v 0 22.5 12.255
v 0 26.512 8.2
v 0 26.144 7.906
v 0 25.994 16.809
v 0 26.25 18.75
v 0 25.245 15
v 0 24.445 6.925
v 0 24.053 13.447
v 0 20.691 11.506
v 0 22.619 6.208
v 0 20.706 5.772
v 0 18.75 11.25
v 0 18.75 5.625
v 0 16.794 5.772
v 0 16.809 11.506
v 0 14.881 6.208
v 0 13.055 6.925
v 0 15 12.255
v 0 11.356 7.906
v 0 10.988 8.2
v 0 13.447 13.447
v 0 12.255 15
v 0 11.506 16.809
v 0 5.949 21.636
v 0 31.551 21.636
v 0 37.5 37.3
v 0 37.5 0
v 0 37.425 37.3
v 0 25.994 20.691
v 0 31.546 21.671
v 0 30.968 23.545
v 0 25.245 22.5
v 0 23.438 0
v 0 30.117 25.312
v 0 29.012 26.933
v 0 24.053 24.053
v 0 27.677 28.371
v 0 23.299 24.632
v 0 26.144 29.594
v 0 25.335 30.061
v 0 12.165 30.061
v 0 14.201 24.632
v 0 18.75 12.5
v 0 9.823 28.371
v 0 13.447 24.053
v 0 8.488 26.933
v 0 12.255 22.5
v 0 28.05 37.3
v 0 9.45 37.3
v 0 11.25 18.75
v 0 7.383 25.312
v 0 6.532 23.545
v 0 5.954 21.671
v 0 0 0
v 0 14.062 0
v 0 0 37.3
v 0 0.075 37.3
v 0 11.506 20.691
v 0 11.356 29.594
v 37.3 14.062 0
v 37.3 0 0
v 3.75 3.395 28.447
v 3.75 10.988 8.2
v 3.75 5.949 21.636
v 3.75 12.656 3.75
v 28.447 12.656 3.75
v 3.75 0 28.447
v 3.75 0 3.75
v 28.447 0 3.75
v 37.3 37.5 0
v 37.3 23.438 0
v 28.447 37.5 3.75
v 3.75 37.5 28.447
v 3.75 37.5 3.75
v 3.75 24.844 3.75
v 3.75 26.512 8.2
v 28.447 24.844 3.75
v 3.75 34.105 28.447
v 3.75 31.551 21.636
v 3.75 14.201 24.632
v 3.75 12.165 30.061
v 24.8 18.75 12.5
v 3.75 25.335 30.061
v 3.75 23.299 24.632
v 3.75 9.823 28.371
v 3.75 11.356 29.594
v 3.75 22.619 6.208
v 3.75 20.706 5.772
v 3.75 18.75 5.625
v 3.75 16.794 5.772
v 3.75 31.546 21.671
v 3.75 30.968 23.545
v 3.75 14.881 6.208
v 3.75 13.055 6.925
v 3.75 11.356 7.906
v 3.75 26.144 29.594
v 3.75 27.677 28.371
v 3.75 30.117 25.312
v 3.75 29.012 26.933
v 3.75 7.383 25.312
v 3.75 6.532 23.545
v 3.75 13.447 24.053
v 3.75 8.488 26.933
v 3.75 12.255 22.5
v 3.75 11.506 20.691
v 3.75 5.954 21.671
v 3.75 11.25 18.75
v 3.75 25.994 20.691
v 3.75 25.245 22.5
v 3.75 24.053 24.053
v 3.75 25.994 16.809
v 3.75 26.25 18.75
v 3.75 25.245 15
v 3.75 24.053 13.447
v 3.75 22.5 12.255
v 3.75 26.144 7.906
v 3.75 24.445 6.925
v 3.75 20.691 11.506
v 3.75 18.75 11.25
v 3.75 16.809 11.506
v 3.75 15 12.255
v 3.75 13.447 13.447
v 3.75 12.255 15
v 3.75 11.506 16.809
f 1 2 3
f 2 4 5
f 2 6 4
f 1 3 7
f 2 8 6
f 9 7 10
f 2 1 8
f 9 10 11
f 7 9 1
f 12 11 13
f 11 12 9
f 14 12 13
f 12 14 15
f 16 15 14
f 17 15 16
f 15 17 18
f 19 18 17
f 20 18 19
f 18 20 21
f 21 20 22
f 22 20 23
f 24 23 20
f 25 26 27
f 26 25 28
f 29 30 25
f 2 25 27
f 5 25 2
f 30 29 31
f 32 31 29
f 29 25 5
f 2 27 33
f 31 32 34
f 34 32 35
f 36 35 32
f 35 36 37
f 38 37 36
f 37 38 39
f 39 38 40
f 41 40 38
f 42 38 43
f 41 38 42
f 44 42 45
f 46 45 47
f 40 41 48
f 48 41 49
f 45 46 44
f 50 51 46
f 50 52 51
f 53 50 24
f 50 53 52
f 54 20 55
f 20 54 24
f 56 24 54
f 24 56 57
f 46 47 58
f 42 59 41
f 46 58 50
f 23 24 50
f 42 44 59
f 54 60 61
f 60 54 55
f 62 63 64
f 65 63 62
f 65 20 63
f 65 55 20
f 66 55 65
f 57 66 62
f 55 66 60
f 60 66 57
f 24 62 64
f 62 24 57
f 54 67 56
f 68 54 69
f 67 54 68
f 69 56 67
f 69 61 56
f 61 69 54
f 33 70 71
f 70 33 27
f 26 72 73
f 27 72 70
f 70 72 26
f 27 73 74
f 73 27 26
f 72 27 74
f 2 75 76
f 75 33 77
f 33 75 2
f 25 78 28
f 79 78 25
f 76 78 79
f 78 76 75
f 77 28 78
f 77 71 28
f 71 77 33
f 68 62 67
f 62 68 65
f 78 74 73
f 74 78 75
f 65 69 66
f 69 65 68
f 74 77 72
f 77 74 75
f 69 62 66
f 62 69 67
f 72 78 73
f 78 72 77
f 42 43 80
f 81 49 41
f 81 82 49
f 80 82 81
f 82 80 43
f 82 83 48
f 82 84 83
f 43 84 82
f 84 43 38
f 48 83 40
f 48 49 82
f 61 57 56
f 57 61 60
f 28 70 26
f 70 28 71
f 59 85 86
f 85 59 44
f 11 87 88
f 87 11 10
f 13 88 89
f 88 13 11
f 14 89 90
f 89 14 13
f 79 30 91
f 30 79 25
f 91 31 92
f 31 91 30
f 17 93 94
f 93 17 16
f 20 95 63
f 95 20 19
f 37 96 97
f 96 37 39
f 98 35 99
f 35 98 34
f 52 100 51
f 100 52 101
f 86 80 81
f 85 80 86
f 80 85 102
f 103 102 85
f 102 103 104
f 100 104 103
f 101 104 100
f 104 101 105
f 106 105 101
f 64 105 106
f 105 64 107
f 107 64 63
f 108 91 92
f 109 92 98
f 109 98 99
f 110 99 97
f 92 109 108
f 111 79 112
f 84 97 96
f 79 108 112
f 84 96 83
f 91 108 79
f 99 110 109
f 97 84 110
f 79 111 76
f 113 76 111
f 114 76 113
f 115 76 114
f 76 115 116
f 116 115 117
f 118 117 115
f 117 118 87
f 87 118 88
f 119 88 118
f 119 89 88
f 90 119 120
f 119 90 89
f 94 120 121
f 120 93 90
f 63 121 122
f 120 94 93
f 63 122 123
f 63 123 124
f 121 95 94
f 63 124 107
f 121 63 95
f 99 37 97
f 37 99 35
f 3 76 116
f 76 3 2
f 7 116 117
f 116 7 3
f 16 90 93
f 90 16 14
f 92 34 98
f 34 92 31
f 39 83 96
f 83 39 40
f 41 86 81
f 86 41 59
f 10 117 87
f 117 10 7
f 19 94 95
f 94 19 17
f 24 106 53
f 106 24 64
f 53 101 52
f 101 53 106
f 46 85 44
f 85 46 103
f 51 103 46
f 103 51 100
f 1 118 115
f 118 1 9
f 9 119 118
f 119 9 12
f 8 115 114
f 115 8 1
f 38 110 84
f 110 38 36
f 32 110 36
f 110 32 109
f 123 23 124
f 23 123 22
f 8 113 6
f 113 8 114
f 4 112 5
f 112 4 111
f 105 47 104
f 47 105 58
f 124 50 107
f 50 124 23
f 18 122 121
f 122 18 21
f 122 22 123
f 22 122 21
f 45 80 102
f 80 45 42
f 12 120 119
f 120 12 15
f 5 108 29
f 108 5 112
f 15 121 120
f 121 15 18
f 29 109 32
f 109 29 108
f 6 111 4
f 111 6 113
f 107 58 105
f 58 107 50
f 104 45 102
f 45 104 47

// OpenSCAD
// file: wedges.scad
module Wedge ( dx, dy, dz ) {
    linear_extrude( dz ) {
        polygon( points = [ [0, 0], [dx, 0], [dx, dy], [0, 0] ] );
    };
};

module BiWedge ( dx, dy, dz ) {
    linear_extrude( dz ) {
        polygon( points = [ [0, 0], [dx, 0], [dx/2, dy], [0, 0] ] );
    };
};
// file: bookend2.scad
use <wedges.scad>

module Bookend2(
        length,
        width,
        height,
        t1,
        t2 )
{
    ratio  = height / (( width - t1 ) / 2 );
    ratio2 = height / length;

    intersection() {
        union() {
            difference() {
                union() {
                    // cut out left wedge in x direction
                    translate( [ 0, (width-t1)/2, 0 ] )
                    mirror( [ 0, 1, 0 ] )
                    rotate( 90, [ 0, 0, 1 ] )
                    rotate( 90, [ 1, 0, 0 ] ) {
                        Wedge( (width-t1)/2, height, length );
                    };

                    // cut out right wedge in x direction
                    translate( [ 0, (width+t1)/2, 0 ] )
                    rotate( 90, [ 0, 0, 1 ] )
                    rotate( 90, [ 1, 0, 0 ] ) {
                        Wedge( (width-t1)/2, height, length );
                    };
                };
                
                // cut out hole in y direction
                myh = height - t2 - t2*ratio2 - t2*sqrt(1+ratio2*ratio2);
                myl = length - t2 - t2/ratio2 - t2*sqrt(1+1/(ratio2*ratio2));
                translate( [ t2, -$eps, t2 ] )
                translate( [ myl, 0, 0 ] )
                rotate( 180, [ 0, 0, 1 ] )
                rotate( 90,  [ 1, 0, 0 ] ) {
                    Wedge( myl, myh, width+2*$eps );
                }
            };

            // cut out biwedge (inner of V) in x direction
            translate( [ 0, t1, height ] )
            mirror( [ 0, 0, 1 ] )
            rotate( 90, [ 0, 0, 1 ] )
            rotate( 90, [ 1, 0, 0 ] ) {
                BiWedge( width-2*t1, ratio * ( width-2*t1)/2, length );
            };
        };

        translate( [ length-$eps, -$eps, -$eps ] )
        rotate( 180, [ 0, 0, 1 ] )
        rotate(  90, [ 1, 0, 0 ] ) {
            Wedge( length+2*$eps, height+2*$eps, width+2*$eps );
        }
    };

    translate( [ 0, width/2, height/2 ] )
    rotate( 90, [ 0, 1, 0 ] ) {
        difference() {
            cylinder( t2, width*.35, width*.35, false );
            translate( [ 0, 0, -$eps ] ) {
                cylinder( t2+2*$eps, width*.2, width*.2, false );
            }
        }
    }
};
// file: bookend1.scad
//
//
//

use <wedges.scad>

module Bookend1(
        length,
        width,
        height,
        t1,
        t2 )
{
    ratio  = height / (( width - t1 ) / 2 );
    ratio2 = height / length;

    difference() {
        // cut out from a cube
        translate( [ $eps, $eps, $eps ] ) {
            cube( [ length-2*$eps, width-2*$eps, height-2*$eps ]);
        }

        // cut out left wedge in x direction
        translate( [ 0, (width-t1)/2, 0 ] )
        mirror( [ 0, 1, 0 ] )
        rotate( 90, [ 0, 0, 1 ] )
        rotate( 90, [ 1, 0, 0 ] ) {
            Wedge( (width-t1)/2, height, length );
        };

        // cut out right wedge in x direction
        translate( [ 0, (width+t1)/2, 0 ] )
        rotate( 90, [ 0, 0, 1 ] )
        rotate( 90, [ 1, 0, 0 ] ) {
            Wedge( (width-t1)/2, height, length );
        };

        // cut out biwedge (inner of V) in x direction
        translate( [ 0, t1, height ] )
        mirror( [ 0, 0, 1 ] )
        rotate( 90, [ 0, 0, 1 ] )
        rotate( 90, [ 1, 0, 0 ] ) {
            BiWedge( width-2*t1, ratio * ( width-2*t1)/2, length );
        };

        // flatten to the right
        translate( [ 0, 0, height ] )
        rotate( -90, [ 1, 0, 0 ]) {
            Wedge( length, height, width );
        };

        // cut out hole in y direction
        myh = height - t2 - t2*ratio2 - t2*sqrt(1+ratio2*ratio2);
        myl = length - t2 - t2/ratio2 - t2*sqrt(1+1/(ratio2*ratio2));
        translate( [ t2, 0, t2 ] )
        translate( [ myl, 0, 0 ] )
        rotate( 180, [ 0, 0, 1 ] )
        rotate( 90,  [ 1, 0, 0 ] ) {
            Wedge( myl, myh, width );
        }
    };
};
// main file
use <bookend1.scad>
use <bookend2.scad>

$scale  = 0.25;
$length = 150 * $scale;
$width  = 150 * $scale;
$height = 150 * $scale;
$t1     = $width/4;
$t2     = 0.4 * $t1;
$eps    = 0.1;
$fa     = 5;

Bookend1( 
        $length,
        $width,
        $height,
        $t1,
        $t2 );

translate( [ $length * 1.2, $width, 0 ] )
rotate( 180, [ 0, 0, 1 ] )
{
    !Bookend2( 
            $length,
            $width,
            $height,
            $t1,
            $t2 );
};
